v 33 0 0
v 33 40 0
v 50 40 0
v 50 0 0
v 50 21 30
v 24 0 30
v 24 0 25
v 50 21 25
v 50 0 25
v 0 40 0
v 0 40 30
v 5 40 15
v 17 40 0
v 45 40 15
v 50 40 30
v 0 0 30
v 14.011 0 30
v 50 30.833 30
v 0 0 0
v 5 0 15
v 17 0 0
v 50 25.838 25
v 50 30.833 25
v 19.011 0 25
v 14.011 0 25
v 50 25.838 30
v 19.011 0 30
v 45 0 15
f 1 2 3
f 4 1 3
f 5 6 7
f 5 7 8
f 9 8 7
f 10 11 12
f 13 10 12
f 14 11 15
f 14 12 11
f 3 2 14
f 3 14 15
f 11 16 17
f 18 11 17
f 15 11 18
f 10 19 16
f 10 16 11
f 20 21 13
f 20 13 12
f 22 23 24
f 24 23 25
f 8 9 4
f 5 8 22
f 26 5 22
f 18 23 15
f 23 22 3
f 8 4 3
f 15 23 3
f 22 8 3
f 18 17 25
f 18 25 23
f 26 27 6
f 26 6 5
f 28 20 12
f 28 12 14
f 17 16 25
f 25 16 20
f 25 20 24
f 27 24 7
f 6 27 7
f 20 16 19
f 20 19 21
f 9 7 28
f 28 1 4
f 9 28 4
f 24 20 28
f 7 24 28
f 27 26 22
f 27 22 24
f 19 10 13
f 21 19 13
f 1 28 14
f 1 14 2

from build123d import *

# Parameters (mm, degrees)
BOX_W           = 50
BOX_H           = 40
BOX_DEPTH       = 30
POCKET_DEPTH    = 40.001
POCKET001_DEPTH = 5
POCKET002_DEPTH = 5


with BuildPart() as part:
    # Box → Box (new body)
    with BuildSketch(Plane.XY):
        with Locations((25, 20)):
            Rectangle(BOX_W, BOX_H)
    extrude(amount=BOX_DEPTH)

    # Sketch → Pocket (cut, through all)
    with BuildSketch(Plane.XZ):
        Polygon((17, 0), (5, 15), (45, 15), (33, 0), align=None)
    extrude(amount=-POCKET_DEPTH, mode=Mode.SUBTRACT)

    # Sketch001 → Pocket001 (cut)
    with BuildSketch(Plane.XY.offset(30)):
        Polygon((50, 0), (24, 0), (50, 21), align=None)
    extrude(amount=-POCKET001_DEPTH, mode=Mode.SUBTRACT)

    # Sketch003 → Pocket002 (cut)
    with BuildSketch(Plane.XY.offset(30)):
        Polygon((19, -0.009107), (14, -0.009107), (50.194458, 31), (50.194458, 26), align=None)
    extrude(amount=-POCKET002_DEPTH, mode=Mode.SUBTRACT)


solid = part.part
